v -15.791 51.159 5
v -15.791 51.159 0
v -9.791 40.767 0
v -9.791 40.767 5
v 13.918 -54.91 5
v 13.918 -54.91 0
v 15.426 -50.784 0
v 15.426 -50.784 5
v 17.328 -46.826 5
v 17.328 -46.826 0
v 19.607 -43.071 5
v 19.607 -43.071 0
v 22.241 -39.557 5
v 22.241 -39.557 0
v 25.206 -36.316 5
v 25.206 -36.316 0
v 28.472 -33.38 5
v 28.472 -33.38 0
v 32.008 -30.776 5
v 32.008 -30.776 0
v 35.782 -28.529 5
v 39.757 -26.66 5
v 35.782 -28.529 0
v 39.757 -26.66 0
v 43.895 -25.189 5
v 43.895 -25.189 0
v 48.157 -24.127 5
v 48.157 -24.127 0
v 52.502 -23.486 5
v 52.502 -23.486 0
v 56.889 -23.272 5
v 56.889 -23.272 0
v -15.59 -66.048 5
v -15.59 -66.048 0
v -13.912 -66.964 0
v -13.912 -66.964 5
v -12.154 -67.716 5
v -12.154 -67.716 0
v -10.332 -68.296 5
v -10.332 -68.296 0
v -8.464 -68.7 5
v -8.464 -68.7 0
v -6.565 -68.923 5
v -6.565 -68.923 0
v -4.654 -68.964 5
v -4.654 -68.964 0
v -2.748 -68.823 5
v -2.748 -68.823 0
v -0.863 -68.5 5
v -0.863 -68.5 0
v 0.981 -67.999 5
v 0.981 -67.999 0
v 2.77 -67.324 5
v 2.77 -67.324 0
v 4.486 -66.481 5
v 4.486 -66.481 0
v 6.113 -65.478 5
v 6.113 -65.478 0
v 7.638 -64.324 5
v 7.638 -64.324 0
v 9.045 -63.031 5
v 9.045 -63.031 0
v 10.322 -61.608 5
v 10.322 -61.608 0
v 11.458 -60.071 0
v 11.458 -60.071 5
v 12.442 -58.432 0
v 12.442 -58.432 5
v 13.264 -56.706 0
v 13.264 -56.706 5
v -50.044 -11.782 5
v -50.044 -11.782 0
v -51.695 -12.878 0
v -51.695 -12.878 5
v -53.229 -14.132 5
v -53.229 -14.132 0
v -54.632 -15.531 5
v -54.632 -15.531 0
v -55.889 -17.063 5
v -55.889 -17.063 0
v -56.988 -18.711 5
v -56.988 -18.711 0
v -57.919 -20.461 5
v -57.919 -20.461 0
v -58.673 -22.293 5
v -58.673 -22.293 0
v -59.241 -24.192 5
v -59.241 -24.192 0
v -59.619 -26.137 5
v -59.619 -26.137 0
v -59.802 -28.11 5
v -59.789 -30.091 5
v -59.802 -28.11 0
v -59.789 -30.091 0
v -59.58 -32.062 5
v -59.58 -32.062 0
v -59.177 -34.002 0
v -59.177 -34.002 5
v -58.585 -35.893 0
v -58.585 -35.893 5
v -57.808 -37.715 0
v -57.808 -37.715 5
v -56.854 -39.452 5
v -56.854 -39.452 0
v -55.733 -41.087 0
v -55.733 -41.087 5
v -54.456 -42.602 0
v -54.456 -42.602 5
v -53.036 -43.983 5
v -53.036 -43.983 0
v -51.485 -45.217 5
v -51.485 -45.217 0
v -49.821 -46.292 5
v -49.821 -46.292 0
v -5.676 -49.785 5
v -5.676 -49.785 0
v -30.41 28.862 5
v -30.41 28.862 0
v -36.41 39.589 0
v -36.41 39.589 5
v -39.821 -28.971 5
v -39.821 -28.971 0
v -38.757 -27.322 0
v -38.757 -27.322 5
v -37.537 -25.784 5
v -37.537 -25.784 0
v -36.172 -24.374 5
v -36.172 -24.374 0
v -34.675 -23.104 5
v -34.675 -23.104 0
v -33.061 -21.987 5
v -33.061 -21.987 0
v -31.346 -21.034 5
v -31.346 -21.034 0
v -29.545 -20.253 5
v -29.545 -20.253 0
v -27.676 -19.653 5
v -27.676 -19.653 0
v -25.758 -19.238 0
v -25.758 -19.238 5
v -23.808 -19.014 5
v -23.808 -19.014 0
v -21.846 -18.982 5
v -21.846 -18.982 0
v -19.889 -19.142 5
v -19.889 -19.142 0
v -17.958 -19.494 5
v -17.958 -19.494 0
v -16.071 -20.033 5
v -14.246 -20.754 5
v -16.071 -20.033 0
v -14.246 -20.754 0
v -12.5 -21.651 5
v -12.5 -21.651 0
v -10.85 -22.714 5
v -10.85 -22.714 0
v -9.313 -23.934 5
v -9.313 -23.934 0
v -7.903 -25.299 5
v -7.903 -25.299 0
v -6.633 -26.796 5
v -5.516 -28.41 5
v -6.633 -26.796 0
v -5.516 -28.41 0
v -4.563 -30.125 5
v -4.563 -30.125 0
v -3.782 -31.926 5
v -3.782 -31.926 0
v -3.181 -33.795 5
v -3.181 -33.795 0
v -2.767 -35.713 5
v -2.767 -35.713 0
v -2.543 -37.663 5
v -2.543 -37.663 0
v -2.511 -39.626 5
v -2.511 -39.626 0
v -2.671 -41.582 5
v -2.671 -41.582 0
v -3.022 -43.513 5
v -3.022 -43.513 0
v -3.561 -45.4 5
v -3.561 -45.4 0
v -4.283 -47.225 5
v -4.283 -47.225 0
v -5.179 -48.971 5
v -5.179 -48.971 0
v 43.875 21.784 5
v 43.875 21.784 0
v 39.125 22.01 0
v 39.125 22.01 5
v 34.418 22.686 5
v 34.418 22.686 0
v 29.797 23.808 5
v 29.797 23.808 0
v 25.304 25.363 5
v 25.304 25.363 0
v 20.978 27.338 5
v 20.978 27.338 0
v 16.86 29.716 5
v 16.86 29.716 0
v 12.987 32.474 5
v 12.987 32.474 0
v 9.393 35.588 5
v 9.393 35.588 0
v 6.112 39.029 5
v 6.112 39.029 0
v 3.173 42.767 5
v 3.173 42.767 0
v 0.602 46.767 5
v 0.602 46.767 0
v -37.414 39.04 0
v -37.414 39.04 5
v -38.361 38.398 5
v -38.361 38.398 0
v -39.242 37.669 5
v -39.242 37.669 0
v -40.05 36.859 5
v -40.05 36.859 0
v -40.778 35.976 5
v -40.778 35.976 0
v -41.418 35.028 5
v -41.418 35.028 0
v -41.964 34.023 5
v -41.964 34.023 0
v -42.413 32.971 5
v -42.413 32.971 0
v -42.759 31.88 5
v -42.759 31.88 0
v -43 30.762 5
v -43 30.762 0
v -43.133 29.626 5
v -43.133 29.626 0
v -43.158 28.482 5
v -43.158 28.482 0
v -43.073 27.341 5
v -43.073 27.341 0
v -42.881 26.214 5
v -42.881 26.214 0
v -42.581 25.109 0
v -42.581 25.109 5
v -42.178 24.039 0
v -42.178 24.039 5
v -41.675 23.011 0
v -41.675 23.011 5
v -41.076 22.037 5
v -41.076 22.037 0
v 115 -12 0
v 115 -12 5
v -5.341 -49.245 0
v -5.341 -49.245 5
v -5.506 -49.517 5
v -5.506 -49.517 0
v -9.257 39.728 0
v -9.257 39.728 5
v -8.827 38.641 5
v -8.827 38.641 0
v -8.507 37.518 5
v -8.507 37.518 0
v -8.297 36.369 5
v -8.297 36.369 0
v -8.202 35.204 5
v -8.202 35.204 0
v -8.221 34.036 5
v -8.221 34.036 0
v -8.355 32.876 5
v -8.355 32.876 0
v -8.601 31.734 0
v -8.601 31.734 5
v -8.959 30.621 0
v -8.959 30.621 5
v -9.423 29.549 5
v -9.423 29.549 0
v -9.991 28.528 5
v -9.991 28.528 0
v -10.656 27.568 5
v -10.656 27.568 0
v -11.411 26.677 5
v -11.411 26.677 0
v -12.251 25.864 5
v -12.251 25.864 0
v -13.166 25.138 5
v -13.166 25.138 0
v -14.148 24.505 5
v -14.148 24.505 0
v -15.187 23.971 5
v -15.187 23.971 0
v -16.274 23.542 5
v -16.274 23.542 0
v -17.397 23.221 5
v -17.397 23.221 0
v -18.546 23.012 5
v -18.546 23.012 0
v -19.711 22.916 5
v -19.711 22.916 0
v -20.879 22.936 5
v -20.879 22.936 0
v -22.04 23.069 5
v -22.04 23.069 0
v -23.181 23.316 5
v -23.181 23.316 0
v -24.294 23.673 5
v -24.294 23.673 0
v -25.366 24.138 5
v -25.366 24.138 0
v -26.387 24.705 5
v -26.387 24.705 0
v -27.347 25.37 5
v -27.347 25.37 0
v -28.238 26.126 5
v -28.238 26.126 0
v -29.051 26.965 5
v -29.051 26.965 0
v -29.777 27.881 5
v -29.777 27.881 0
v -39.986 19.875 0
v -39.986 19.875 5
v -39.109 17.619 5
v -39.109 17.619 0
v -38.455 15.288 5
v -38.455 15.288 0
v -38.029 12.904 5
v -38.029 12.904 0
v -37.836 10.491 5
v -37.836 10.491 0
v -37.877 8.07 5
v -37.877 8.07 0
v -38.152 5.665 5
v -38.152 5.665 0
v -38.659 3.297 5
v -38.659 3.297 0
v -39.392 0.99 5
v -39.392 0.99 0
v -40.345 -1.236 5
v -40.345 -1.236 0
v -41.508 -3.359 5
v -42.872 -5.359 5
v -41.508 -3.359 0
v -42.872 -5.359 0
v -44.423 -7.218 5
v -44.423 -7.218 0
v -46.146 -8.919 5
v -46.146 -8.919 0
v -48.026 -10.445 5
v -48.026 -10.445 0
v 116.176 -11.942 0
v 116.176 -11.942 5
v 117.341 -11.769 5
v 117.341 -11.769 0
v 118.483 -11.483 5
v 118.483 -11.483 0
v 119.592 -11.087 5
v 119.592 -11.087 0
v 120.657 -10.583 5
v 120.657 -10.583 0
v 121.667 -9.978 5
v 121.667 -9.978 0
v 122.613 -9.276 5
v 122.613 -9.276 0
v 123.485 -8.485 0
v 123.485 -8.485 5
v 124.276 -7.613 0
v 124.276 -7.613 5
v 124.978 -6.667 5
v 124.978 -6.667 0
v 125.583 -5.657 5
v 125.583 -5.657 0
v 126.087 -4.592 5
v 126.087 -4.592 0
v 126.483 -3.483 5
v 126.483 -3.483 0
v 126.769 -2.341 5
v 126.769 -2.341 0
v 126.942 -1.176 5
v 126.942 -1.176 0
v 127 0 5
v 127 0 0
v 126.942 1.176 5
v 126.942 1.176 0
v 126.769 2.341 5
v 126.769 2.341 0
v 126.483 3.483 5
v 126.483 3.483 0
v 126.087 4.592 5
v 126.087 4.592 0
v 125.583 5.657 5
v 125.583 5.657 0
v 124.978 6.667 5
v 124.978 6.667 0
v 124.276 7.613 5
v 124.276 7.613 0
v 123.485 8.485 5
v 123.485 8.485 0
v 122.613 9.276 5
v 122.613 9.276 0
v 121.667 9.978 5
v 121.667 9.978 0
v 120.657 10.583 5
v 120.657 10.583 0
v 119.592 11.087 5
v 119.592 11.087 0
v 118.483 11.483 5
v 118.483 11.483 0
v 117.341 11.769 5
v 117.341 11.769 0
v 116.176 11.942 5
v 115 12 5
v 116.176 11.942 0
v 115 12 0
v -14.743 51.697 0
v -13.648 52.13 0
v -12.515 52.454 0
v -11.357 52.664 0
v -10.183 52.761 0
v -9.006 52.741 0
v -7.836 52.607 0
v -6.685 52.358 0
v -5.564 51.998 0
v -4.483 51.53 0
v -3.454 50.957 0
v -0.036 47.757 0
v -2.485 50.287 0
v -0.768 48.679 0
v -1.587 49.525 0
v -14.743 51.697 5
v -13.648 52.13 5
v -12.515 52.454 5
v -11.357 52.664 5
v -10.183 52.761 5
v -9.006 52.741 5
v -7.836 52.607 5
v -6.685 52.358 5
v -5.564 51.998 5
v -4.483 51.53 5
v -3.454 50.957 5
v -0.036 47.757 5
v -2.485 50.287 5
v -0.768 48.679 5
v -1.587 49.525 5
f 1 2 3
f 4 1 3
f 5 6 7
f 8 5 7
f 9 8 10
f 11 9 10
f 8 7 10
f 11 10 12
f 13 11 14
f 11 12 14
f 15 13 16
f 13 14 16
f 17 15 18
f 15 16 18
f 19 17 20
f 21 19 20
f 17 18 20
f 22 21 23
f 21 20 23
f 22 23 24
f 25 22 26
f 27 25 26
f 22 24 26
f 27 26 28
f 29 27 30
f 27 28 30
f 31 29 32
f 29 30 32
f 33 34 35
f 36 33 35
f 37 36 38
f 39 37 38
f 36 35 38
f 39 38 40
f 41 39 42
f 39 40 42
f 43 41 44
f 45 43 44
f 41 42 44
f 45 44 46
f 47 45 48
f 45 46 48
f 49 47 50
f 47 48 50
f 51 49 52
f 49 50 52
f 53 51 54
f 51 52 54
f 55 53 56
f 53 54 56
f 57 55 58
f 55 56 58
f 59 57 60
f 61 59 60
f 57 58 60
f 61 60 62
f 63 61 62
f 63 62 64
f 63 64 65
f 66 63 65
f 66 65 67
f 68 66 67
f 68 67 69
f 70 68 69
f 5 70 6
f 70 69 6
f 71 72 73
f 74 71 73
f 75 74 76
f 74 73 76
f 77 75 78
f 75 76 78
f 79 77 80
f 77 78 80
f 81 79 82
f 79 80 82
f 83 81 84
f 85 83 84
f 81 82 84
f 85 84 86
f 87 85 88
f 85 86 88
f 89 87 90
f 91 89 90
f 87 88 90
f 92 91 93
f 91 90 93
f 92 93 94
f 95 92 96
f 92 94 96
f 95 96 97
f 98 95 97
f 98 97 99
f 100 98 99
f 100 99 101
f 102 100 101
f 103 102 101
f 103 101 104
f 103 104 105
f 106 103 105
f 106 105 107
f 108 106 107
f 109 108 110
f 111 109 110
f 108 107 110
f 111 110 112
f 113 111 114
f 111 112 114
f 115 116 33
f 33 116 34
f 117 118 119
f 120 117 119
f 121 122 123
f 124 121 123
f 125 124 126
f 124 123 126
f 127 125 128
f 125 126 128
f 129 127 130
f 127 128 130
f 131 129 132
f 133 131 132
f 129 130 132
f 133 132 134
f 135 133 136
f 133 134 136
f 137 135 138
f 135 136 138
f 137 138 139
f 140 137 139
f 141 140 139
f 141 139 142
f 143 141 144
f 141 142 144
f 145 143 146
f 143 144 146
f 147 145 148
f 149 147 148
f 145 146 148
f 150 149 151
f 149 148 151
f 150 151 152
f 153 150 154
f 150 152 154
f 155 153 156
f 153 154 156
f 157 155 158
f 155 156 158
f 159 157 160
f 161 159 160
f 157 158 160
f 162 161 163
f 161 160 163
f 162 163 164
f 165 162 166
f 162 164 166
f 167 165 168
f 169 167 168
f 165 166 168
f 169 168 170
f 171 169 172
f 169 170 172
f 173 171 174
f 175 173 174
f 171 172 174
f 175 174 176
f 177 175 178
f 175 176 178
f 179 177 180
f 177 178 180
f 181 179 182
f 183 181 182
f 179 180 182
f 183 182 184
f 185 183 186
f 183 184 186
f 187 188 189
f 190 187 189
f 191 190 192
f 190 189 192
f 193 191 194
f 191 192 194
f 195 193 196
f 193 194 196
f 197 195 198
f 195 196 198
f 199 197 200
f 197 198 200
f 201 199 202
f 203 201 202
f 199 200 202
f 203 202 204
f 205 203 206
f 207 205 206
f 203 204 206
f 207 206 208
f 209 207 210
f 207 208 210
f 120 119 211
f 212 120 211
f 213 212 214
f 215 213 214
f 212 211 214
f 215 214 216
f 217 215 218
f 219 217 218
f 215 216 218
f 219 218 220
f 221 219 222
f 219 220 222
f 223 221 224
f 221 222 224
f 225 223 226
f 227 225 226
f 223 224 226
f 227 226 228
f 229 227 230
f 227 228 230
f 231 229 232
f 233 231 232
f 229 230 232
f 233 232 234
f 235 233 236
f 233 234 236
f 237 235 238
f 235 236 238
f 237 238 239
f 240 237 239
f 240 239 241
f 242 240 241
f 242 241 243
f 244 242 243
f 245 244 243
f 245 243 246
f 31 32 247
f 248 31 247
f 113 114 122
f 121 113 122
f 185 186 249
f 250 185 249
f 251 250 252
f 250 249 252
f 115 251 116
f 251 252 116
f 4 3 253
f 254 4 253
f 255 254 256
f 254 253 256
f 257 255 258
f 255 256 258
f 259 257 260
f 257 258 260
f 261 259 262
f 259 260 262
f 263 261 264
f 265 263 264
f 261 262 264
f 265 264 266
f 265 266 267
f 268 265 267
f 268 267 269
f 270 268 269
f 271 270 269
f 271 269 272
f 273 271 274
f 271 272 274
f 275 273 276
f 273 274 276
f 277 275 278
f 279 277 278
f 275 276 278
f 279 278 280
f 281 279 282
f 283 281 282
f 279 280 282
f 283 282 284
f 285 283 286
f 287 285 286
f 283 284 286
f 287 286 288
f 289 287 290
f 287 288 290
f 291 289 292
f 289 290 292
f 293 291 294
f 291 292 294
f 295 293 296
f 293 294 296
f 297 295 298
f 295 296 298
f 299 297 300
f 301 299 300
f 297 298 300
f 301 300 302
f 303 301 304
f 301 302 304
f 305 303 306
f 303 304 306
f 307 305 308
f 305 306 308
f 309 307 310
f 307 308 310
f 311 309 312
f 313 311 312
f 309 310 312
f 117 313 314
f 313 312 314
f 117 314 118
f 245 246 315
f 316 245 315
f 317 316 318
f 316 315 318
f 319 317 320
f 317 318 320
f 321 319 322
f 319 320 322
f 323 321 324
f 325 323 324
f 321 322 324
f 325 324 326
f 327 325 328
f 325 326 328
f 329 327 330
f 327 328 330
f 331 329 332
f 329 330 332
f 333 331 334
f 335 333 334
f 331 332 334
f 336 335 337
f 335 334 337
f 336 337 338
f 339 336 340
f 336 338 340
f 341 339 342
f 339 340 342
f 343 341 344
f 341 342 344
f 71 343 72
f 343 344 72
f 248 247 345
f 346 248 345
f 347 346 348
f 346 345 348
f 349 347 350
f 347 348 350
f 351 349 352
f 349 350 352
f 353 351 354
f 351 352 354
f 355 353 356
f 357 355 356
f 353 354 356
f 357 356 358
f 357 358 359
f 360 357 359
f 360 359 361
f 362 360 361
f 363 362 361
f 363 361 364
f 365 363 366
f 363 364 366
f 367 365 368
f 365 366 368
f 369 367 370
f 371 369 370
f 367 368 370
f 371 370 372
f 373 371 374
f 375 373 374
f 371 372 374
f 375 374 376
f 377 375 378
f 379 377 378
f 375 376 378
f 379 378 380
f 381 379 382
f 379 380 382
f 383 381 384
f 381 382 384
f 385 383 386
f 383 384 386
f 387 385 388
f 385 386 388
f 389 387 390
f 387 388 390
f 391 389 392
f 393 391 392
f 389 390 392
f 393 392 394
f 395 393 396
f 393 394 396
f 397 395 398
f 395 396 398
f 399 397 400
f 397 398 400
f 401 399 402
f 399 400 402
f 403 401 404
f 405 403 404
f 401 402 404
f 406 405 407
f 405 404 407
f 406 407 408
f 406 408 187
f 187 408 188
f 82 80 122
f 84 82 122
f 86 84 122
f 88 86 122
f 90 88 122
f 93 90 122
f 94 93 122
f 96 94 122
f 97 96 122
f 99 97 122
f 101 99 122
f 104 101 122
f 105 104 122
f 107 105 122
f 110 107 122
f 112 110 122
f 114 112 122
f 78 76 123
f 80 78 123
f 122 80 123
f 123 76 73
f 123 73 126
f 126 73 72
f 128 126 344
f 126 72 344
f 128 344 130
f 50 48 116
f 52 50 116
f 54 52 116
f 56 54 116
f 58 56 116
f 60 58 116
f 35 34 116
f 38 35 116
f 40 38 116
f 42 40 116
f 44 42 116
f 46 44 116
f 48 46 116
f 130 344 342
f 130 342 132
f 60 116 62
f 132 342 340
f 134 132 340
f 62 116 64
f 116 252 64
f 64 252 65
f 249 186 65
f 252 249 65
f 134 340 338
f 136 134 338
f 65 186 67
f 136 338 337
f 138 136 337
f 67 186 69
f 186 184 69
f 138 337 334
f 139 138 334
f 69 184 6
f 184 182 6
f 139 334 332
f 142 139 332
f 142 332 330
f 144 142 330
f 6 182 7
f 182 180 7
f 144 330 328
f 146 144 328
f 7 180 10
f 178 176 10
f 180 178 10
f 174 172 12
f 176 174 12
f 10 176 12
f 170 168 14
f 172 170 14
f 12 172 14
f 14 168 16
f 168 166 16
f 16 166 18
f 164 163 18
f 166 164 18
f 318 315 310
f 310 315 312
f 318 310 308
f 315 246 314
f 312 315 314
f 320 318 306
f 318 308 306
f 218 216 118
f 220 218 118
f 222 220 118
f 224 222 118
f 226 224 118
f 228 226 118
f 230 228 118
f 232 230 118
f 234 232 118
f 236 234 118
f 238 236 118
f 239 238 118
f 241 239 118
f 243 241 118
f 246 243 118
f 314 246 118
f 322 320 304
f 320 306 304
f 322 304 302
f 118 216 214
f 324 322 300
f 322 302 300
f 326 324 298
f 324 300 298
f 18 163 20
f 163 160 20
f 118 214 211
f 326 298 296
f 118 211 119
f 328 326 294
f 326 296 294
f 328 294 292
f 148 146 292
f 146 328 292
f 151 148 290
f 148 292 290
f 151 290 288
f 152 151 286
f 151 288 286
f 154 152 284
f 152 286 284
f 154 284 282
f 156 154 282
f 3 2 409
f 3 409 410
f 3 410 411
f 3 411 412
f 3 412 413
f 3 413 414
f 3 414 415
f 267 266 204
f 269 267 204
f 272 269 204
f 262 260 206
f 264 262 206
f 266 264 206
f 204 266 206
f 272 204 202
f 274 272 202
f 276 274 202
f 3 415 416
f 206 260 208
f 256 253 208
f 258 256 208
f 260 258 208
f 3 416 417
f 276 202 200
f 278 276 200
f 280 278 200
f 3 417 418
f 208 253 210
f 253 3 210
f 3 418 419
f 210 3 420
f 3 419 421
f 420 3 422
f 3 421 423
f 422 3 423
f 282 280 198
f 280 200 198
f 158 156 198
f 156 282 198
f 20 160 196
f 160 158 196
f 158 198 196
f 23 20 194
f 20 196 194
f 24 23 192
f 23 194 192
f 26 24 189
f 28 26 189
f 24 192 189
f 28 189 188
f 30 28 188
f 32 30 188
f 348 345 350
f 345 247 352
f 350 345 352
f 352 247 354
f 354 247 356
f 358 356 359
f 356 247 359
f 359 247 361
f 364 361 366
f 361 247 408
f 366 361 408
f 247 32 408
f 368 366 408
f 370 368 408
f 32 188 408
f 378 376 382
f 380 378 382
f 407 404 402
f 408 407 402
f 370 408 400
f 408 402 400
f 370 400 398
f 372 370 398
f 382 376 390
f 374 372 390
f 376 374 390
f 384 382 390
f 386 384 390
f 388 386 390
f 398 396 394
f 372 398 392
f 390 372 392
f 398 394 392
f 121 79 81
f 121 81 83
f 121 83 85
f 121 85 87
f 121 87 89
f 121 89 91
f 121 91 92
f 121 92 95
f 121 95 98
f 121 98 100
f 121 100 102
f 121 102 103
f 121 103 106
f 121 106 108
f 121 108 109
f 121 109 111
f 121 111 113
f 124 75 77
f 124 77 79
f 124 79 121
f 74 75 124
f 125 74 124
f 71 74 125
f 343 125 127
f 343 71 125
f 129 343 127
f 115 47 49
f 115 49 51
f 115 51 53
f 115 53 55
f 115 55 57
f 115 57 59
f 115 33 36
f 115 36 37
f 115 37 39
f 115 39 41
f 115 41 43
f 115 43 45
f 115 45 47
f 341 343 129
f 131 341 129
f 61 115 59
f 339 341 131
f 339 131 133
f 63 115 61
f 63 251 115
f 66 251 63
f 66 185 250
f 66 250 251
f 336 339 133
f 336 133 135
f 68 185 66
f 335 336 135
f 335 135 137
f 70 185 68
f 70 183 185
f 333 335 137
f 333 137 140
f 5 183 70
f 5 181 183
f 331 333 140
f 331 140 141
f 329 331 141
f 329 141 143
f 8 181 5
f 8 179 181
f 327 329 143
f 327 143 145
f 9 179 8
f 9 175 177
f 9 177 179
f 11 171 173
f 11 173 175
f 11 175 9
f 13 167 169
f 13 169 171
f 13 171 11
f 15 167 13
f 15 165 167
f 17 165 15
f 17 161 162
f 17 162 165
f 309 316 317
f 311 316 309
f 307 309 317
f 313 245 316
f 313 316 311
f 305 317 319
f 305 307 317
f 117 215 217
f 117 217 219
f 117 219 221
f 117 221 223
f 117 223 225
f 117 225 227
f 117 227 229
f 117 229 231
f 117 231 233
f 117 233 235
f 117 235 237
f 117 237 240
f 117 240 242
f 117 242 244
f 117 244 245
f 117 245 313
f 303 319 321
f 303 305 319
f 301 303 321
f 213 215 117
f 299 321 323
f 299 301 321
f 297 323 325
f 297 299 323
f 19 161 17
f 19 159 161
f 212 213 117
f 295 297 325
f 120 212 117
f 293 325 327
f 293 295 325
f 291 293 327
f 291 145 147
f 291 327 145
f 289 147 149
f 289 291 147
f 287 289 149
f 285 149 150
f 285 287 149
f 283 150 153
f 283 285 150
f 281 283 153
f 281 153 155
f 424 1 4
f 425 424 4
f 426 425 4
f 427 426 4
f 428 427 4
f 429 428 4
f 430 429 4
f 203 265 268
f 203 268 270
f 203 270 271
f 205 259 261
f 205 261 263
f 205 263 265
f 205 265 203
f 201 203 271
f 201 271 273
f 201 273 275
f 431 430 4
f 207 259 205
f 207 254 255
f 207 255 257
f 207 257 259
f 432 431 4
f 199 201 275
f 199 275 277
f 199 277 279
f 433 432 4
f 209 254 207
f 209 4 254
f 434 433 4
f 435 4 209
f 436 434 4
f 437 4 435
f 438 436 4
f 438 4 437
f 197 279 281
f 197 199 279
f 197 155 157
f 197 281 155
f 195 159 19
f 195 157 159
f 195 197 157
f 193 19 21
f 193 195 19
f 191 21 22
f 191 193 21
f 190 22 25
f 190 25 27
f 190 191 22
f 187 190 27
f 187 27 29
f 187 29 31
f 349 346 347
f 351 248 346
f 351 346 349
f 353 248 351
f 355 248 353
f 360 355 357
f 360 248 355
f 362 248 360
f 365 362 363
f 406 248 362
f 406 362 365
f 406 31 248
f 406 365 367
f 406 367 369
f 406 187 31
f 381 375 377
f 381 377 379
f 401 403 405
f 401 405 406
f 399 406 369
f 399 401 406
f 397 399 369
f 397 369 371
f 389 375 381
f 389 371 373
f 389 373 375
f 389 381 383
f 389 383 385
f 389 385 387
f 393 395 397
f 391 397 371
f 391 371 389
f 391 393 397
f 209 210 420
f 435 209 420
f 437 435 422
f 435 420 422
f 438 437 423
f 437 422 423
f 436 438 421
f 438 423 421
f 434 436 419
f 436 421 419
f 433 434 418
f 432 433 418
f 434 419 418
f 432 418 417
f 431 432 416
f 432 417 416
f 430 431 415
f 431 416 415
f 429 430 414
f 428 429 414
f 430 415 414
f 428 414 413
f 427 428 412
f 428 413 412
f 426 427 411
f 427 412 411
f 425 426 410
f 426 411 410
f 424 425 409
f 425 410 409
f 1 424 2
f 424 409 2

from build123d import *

# Parameters (mm, degrees)
BOSS_EXTRUDE2_DEPTH = 5


with BuildPart() as part:
    # Sketch1 → Boss-Extrude2 (new body)
    with BuildSketch(Plane.XY):
        with BuildLine():
            Line((-30.410051578, 28.86238305), (-36.410051578, 39.588721298))
            ThreePointArc((-36.410051578, 39.588721298), (-42.759129148, 31.880332669), (-41.076365657, 22.036636805))
            ThreePointArc((-41.076365657, 22.036636805), (-38.658640478, 3.297393101), (-50.044050262, -11.781635174))
            ThreePointArc((-50.044050262, -11.781635174), (-59.820088495, -29.100692514), (-49.820508076, -46.291651246))
            Line((-49.820508076, -46.291651246), (-39.820508076, -28.97114317))
            ThreePointArc((-39.820508076, -28.97114317), (-12.5, -21.650635095), (-5.179491924, -48.97114317))
            ThreePointArc((-5.179491924, -48.97114317), (-5.422797128, -49.381193221), (-5.675808094, -49.78532676))
            Line((-5.675808094, -49.78532676), (-15.589541975, -66.048346043))
            ThreePointArc((-15.589541975, -66.048346043), (1.883571693, -67.682453449), (13.918479383, -54.909787119))
            ThreePointArc((13.918479383, -54.909787119), (30.208282334, -32.034409255), (56.888914824, -23.271736004))
            Line((56.888914824, -23.271736004), (115, -12))
            ThreePointArc((115, -12), (127, 0), (115, 12))
            Line((115, 12), (43.874557006, 21.783515632))
            ThreePointArc((43.874557006, 21.783515632), (18.891003915, 28.477838507), (0.601773699, 46.767068722))
            ThreePointArc((0.601773699, 46.767068722), (-6.684702605, 52.358178638), (-15.790531146, 51.159373568))
            Line((-15.790531146, 51.159373568), (-9.790531146, 40.767068722))
            ThreePointArc((-9.790531146, 40.767068722), (-14.147948526, 24.50496567), (-30.410051578, 28.86238305))
        make_face()
    extrude(amount=BOSS_EXTRUDE2_DEPTH)


solid = part.part
